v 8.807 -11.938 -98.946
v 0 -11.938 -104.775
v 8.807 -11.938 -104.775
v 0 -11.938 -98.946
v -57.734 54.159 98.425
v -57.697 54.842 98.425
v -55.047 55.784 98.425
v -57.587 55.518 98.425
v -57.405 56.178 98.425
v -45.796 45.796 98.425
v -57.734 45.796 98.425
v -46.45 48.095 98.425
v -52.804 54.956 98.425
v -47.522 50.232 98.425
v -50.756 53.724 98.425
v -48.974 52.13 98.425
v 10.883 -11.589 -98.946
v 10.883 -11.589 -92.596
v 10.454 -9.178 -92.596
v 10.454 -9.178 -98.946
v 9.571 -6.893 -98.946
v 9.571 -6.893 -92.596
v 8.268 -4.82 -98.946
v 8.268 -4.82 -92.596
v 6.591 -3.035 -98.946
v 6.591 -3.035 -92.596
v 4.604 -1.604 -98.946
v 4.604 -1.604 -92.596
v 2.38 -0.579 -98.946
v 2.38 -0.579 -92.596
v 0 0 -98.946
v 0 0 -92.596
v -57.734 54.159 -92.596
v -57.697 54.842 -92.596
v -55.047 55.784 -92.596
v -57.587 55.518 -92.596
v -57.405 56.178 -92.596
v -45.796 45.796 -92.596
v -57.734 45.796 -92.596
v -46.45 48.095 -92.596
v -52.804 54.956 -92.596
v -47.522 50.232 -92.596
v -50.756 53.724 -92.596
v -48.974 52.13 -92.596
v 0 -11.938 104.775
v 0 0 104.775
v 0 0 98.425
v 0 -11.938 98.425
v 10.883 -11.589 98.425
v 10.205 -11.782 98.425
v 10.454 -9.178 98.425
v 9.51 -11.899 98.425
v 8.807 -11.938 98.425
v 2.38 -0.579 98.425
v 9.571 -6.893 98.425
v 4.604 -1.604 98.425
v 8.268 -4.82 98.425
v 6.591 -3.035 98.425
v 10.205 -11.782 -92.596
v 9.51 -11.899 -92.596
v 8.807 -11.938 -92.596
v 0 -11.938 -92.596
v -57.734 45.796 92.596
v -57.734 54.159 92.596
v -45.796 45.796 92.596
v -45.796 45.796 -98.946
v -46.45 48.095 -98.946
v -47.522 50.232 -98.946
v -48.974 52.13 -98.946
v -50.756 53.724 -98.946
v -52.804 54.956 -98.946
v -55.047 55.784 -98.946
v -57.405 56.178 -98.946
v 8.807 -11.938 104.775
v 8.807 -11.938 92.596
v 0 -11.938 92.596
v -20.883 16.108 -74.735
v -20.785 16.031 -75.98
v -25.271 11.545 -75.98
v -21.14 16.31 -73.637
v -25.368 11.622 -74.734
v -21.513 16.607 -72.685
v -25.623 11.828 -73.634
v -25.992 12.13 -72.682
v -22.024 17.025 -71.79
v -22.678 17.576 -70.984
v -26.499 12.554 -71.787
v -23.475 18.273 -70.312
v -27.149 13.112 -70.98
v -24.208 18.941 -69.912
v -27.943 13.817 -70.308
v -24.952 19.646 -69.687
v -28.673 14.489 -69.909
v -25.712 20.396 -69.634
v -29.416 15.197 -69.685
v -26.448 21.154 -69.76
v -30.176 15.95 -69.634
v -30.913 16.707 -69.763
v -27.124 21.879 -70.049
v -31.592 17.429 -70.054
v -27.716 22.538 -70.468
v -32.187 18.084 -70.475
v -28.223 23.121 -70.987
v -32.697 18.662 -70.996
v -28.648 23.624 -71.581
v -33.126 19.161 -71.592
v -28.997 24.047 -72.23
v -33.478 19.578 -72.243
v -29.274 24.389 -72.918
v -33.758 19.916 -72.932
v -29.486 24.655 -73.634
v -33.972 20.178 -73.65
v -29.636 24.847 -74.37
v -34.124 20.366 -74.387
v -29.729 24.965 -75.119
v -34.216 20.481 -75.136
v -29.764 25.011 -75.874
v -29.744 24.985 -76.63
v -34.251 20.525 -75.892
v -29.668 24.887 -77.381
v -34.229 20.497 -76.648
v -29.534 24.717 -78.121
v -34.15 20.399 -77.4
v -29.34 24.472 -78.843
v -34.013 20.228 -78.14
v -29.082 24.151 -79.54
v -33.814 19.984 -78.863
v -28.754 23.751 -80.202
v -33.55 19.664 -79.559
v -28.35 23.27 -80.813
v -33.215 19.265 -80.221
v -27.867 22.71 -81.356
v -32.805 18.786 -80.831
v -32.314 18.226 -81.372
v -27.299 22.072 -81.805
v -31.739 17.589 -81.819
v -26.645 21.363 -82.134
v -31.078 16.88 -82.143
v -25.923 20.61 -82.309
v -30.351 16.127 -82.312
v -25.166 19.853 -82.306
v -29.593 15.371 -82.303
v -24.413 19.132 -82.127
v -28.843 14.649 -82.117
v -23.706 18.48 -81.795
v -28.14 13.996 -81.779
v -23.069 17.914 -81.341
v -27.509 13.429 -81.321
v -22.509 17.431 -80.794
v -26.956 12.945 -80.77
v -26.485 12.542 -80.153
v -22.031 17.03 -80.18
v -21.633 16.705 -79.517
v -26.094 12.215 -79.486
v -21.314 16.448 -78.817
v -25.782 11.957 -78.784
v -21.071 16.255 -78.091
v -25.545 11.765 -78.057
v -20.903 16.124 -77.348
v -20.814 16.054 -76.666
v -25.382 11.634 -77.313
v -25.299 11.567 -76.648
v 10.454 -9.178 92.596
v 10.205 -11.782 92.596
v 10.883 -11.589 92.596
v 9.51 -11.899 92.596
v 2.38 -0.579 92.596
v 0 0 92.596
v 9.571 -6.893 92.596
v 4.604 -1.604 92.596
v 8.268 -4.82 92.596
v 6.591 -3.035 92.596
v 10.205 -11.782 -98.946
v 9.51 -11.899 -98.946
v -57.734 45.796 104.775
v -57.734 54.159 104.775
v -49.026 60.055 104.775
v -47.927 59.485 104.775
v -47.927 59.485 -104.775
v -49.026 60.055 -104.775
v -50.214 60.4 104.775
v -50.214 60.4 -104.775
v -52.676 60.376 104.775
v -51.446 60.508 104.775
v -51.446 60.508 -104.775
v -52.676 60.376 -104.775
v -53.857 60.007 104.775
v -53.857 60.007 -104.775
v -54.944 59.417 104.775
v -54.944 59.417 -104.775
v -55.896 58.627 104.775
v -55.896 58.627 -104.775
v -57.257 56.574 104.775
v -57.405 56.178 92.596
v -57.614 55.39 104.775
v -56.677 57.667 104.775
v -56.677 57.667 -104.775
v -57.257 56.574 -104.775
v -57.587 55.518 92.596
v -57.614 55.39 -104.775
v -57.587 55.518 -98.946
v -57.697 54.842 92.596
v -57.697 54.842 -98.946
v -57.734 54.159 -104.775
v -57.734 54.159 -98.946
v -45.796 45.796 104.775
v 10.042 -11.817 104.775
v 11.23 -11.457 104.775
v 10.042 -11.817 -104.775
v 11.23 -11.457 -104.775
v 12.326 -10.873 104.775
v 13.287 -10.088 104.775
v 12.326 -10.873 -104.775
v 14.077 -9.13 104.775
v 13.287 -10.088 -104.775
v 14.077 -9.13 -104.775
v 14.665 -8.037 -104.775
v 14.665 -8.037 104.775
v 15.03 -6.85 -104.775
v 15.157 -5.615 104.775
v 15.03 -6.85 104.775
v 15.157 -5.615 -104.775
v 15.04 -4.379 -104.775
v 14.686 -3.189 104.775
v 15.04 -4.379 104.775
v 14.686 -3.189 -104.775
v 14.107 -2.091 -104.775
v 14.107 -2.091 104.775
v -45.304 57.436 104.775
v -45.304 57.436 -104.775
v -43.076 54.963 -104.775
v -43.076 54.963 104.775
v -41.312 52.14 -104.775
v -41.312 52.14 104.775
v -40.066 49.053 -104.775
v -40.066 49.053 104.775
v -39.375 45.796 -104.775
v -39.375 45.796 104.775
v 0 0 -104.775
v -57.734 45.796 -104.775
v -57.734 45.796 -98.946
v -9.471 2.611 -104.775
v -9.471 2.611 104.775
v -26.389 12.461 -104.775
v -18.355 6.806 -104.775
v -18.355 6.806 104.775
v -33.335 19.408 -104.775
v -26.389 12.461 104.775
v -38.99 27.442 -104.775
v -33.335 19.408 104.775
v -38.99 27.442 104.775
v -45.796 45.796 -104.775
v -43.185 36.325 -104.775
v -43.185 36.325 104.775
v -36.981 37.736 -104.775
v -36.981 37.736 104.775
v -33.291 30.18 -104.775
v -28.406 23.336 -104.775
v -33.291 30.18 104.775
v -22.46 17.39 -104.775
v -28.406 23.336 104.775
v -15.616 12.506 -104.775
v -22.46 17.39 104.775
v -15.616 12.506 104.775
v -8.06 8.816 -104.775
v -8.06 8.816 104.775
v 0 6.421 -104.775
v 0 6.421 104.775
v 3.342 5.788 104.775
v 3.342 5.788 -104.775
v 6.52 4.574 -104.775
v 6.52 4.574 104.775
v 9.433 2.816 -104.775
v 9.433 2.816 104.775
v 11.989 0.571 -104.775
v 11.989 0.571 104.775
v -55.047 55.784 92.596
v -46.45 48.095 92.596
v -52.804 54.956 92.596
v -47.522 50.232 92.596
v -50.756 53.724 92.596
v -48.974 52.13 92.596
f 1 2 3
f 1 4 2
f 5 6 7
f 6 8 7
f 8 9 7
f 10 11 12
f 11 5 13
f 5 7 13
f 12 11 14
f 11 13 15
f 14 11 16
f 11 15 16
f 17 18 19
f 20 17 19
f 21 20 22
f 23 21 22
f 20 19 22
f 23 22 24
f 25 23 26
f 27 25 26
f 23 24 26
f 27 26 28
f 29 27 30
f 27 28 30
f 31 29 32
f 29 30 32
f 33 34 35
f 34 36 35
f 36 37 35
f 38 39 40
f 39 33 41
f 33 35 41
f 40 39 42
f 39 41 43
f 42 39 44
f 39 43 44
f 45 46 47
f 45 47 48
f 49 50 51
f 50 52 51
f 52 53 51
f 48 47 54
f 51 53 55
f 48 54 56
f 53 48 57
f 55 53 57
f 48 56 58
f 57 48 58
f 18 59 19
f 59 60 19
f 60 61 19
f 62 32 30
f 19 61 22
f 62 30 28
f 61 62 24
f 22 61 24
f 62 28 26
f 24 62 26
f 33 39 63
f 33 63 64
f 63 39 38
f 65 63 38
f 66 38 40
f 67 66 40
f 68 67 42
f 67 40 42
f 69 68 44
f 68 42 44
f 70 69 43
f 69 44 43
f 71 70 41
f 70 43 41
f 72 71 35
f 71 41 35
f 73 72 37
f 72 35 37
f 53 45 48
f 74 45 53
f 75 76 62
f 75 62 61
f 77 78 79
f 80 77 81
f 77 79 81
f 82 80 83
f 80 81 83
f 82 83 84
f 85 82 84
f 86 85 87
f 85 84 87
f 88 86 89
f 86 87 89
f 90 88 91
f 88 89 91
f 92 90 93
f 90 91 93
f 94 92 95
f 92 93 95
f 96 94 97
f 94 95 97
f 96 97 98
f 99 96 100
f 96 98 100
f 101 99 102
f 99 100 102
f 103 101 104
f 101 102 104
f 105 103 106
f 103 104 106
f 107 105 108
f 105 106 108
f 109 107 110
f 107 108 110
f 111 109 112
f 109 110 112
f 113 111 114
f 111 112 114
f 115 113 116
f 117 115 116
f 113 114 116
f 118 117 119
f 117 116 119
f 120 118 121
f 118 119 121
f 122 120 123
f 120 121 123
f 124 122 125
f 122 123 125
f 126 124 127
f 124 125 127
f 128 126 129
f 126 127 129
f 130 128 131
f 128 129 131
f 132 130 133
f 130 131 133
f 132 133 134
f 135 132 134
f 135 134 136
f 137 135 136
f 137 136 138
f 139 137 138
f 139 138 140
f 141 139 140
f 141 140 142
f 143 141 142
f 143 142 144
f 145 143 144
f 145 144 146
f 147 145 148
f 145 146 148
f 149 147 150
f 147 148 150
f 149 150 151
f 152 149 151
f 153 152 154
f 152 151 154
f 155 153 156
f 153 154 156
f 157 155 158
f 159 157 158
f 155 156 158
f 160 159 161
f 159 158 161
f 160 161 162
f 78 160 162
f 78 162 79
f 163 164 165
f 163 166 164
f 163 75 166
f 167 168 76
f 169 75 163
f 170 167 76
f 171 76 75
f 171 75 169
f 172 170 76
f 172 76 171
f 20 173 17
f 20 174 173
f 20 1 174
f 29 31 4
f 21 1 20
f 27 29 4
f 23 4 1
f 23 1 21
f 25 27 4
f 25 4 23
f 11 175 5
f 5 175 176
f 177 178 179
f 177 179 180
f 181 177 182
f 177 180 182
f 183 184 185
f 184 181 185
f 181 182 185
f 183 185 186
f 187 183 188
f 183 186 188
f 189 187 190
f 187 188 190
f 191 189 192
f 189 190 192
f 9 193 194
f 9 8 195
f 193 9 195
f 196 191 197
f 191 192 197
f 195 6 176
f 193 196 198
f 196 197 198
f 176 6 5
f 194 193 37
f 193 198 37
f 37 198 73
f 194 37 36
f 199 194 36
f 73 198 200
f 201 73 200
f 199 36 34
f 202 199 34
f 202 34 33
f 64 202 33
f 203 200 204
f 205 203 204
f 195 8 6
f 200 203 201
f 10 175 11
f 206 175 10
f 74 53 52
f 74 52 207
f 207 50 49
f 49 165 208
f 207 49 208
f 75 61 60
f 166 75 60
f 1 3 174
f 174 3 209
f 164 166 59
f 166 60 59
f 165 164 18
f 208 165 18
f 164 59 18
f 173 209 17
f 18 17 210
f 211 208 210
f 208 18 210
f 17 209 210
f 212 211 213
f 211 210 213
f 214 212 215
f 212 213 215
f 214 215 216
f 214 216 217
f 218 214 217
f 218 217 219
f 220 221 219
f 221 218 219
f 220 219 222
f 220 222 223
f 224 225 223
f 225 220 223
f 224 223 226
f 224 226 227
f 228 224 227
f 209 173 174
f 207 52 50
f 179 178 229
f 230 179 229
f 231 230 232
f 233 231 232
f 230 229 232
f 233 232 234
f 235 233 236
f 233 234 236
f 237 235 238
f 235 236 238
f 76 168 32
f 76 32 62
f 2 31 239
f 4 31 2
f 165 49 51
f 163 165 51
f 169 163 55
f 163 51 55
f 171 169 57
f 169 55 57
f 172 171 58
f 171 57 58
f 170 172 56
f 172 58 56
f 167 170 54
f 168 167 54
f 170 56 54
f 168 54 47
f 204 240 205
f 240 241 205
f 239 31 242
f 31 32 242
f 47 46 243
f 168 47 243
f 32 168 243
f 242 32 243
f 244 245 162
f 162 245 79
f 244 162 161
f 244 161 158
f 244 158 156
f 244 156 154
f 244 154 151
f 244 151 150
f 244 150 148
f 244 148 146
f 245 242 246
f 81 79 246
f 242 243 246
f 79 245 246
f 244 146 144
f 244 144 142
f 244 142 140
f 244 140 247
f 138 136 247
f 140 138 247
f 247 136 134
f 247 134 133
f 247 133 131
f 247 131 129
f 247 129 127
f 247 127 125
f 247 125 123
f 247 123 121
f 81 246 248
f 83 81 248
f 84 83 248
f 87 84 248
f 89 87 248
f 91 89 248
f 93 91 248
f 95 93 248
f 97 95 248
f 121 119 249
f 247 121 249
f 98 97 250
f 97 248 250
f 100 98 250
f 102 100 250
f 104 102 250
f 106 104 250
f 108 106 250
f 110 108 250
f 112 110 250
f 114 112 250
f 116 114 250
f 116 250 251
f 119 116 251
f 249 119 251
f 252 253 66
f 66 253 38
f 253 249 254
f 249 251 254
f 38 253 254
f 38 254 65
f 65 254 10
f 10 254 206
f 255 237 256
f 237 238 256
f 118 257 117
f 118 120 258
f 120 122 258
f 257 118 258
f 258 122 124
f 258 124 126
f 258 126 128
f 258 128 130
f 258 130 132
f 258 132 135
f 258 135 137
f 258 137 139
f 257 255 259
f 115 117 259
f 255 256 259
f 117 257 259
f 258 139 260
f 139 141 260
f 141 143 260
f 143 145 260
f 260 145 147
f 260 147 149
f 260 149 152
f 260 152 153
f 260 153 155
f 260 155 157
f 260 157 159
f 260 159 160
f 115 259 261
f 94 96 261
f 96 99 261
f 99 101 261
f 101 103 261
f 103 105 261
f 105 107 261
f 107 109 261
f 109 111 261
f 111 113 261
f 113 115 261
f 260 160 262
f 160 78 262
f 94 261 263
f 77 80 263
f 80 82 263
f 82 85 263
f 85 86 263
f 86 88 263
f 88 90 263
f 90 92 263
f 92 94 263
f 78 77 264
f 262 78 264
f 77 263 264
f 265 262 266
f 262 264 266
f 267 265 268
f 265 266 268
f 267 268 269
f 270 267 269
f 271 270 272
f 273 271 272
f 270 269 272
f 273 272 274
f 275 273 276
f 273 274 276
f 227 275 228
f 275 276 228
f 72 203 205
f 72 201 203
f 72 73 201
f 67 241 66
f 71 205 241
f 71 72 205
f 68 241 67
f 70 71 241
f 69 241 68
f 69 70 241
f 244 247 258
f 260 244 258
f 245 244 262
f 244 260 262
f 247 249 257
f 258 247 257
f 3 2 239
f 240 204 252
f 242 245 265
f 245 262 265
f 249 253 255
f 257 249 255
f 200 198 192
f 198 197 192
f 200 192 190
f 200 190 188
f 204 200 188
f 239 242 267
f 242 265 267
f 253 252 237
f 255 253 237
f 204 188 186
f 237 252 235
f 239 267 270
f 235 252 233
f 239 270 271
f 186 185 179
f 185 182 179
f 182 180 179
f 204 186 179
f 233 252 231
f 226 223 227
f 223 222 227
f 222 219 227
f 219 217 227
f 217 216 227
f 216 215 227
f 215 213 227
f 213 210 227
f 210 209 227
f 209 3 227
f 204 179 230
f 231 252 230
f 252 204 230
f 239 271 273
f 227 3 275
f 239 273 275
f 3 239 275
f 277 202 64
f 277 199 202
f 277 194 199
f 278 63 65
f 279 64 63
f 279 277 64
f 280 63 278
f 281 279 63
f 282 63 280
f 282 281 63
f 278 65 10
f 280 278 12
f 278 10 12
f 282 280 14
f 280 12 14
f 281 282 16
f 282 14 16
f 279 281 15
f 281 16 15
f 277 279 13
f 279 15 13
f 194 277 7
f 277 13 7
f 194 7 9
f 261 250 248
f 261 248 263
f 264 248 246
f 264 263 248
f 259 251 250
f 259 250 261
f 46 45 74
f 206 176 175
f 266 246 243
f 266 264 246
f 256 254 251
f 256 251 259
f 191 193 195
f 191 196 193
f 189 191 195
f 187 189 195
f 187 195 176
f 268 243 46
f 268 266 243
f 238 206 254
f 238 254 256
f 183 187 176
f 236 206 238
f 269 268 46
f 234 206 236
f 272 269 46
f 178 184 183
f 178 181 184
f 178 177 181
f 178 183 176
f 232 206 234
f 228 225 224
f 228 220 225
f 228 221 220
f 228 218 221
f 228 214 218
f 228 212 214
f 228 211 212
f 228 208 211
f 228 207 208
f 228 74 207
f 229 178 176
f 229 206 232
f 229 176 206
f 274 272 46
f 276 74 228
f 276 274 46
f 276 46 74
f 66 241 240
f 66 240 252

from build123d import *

# Parameters (mm, degrees)
BOSS_EXTRUDE1_DEPTH = 104.775
BOSS_EXTRUDE2_DEPTH = 92.5957
BOSS_EXTRUDE3_START = -5.8293
BOSS_EXTRUDE3_DEPTH = 5.8293
BOSS_EXTRUDE4_DEPTH = 6.35
SKETCH5_W           = 7.787485422
SKETCH5_H           = 19.833751934
SKETCH5_W_2         = 22.754058967
SKETCH5_H_2         = 3.407024872
CUT_EXTRUDE1_DEPTH  = 227.312030137
FILLET1_R           = 6.35
SKETCH6_R           = 6.35
CUT_EXTRUDE2_DEPTH  = 6.35


with BuildPart() as part:
    # Sketch1 → Boss-Extrude1 (new, symmetric)
    with BuildSketch(Plane.XY):
        with BuildLine():
            Line((-58.2422, 56.2102), (-58.2422, 62.5602))
            ThreePointArc((-58.2422, 62.5602), (-45.640852469, 57.743322347), (-39.3748699, 45.7962))
            ThreePointArc((-39.3748699, 45.7962), (-25.556268964, 20.239931036), (0, 6.4213301))
            ThreePointArc((0, 6.4213301), (12.247457496, 0.293755183), (17.272, -12.446))
            Line((17.272, -12.446), (10.922, -12.446))
            ThreePointArc((10.922, -12.446), (7.760938146, -4.204686933), (0, 0))
            ThreePointArc((0, 0), (-30.011530905, 15.784669095), (-45.7962, 45.7962))
            ThreePointArc((-45.7962, 45.7962), (-50.144819563, 53.243313205), (-58.2422, 56.2102))
        make_face()
    extrude(amount=BOSS_EXTRUDE1_DEPTH, both=True)


with BuildPart() as boss_extrude2_tool:
    # Sketch2 → Boss-Extrude2 (new, symmetric)
    with BuildSketch(Plane.XY):
        with BuildLine():
            Line((-58.2422, 56.2102), (-58.2422, 45.796198296))
            Line((-58.2422, 45.796198296), (-45.796199685, 45.796198296))
            ThreePointArc((-45.796199685, 45.796198296), (-50.144818899, 53.243312648), (-58.2422, 56.2102))
        make_face()
        with BuildLine():
            Line((0, 0), (0, -12.446))
            Line((0, -12.446), (10.922, -12.446))
            ThreePointArc((10.922, -12.446), (7.760938146, -4.204686933), (0, 0))
        make_face()
    extrude(amount=BOSS_EXTRUDE2_DEPTH, both=True)


with BuildPart() as part_1:
    add(part.part)


with BuildPart() as part_2:
    # Boss-Extrude2: joined with boss_extrude2_tool
    add(part_1.part.fuse(boss_extrude2_tool.part, tol=0.00001))

    # Sketch3 → Boss-Extrude3 (add)
    with BuildSketch(Plane(origin=(0, 0, -104.775), x_dir=(-1, 0, 0), z_dir=(0, 0, -1)).offset(BOSS_EXTRUDE3_START)):
        with BuildLine():
            Line((58.2422, 56.2102), (58.2422, 45.796198296))
            Line((58.2422, 45.796198296), (45.7962, 45.7962))
            ThreePointArc((45.7962, 45.7962), (50.144819563, 53.243313205), (58.2422, 56.2102))
        make_face()
        with BuildLine():
            Line((0, 0), (0, -12.446))
            Line((0, -12.446), (-10.922, -12.446))
            ThreePointArc((-10.922, -12.446), (-7.760938146, -4.204686933), (0, 0))
        make_face()
    extrude(amount=BOSS_EXTRUDE3_DEPTH)

    # Sketch4 → Boss-Extrude4 (add)
    with BuildSketch(Plane.XY.offset(104.775)):
        with BuildLine():
            Line((-58.2422, 56.2102), (-58.2422, 45.796198296))
            Line((-58.2422, 45.796198296), (-45.7962, 45.7962))
            ThreePointArc((-45.7962, 45.7962), (-50.144819563, 53.243313205), (-58.2422, 56.2102))
        make_face()
        with BuildLine():
            Line((0, 0), (0, -12.446))
            Line((0, -12.446), (10.922, -12.446))
            ThreePointArc((10.922, -12.446), (7.760938146, -4.204686933), (0, 0))
        make_face()
    extrude(amount=-BOSS_EXTRUDE4_DEPTH)

    # Sketch5 → Cut-Extrude1 (cut, through all)
    with BuildSketch(Plane.XY.offset(104.775)):
        with Locations((-61.627942711, 54.680509116)):
            Rectangle(SKETCH5_W, SKETCH5_H)
        with Locations((8.225058429, -13.641512436)):
            Rectangle(SKETCH5_W_2, SKETCH5_H_2)
    extrude(amount=-CUT_EXTRUDE1_DEPTH, mode=Mode.SUBTRACT)

    # Fillet1
    # the kernel refuses this fillet: 6.35 mm, written as the material it takes off along each edge
    with BuildSketch(Plane(origin=(17.260151367, -11.938, -130.624178653), x_dir=(-0.30497213299383213, 0.9523612749882223, 0), z_dir=(0, 0, 1))) as fillet1_piece_1:
        with BuildLine():
            CenterArc((8.625598356, 6.114282737), FILLET1_R, 162.243512631, 123.416753829)
            Line((2.57810426, 8.050855782), (0, 0))
            ThreePointArc((0, 0), (5.169835731, -0.710949564), (10.339671461, 0))
        make_face()
    extrude(amount=261.248357306, mode=Mode.SUBTRACT)
    with BuildSketch(Plane(origin=(-57.7342, 62.551510856, -130.462315531), x_dir=(0.9544368882494849, -0.29841284548196007, 0), z_dir=(0, 0, 1))) as fillet1_piece_2:
        with BuildLine():
            CenterArc((8.565200947, -6.11549994), FILLET1_R, 74.380472255, 122.981827606)
            Line((2.504526706, -8.010421509), (0, 0))
            ThreePointArc((0, 0), (5.137463106, 0.704636839), (10.274926212, 0))
        make_face()
    extrude(amount=260.924631062, mode=Mode.SUBTRACT)

    # Sketch6 → Cut-Extrude2 (cut, symmetric)
    with BuildSketch(Plane(origin=(-5.969, -5.969000176, 0), x_dir=(-0.7071067916239179, 0.7071067707491772, 0), z_dir=(-0.7071067707491772, -0.7071067916239179, 0))):
        with Locations(Location((32.382802858, 75.980128158, 0), (0, 0, 180))):
            Circle(SKETCH6_R)
    extrude(amount=CUT_EXTRUDE2_DEPTH, both=True, mode=Mode.SUBTRACT)


solid = part_2.part
